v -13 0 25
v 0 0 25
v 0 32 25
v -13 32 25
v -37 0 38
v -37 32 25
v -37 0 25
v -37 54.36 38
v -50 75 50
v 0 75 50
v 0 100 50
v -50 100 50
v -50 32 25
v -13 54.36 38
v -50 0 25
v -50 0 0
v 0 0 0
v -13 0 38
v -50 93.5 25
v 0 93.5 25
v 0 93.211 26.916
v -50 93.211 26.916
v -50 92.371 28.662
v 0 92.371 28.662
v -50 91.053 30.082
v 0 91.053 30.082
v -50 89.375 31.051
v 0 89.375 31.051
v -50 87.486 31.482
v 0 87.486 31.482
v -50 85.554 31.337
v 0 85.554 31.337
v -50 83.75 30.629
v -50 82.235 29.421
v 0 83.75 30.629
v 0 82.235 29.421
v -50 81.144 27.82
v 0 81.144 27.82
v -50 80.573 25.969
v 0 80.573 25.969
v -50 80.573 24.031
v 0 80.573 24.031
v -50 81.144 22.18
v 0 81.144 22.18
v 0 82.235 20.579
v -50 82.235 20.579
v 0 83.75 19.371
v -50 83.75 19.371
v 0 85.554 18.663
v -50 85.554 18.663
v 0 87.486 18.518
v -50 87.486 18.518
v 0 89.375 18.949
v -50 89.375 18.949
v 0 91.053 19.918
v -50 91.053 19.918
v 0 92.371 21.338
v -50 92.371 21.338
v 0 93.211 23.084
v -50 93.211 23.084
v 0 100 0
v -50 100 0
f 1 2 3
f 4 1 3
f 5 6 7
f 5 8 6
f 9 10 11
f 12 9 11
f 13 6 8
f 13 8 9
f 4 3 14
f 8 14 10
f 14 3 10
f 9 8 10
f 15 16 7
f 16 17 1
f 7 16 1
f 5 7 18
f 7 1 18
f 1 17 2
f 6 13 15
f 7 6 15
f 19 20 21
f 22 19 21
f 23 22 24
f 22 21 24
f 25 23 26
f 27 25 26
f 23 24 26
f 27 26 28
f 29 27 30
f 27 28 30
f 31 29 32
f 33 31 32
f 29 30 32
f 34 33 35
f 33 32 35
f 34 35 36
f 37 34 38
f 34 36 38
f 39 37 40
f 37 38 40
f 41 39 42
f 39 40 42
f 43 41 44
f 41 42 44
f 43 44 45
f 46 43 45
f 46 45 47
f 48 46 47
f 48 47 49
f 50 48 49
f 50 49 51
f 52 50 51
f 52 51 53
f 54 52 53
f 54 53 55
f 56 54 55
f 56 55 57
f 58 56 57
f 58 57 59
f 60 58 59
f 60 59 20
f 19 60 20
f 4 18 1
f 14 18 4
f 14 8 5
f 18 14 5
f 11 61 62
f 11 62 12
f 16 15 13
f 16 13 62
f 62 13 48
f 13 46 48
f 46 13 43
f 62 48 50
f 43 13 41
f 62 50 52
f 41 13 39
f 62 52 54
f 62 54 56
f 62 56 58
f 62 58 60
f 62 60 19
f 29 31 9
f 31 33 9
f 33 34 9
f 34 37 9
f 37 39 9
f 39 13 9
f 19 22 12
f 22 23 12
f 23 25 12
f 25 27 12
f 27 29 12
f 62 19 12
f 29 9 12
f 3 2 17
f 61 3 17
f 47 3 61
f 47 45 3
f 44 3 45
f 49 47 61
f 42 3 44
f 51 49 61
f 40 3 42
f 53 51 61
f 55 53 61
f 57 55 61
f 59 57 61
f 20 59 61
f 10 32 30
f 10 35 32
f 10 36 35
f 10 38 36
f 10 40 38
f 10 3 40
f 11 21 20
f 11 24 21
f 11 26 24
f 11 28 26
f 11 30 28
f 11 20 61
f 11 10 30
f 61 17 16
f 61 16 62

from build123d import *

# Parameters (mm, degrees)
F0_W     = 100
F0_H     = 50
F1_DEPTH = 50
F2_R     = 6.5
F3_DEPTH = 50.001
F4_DEPTH = 13
F7_DEPTH = 13
F9_DEPTH = 25


with BuildPart() as f1:
    # F0 (on Right) → F1 (new body)
    with BuildSketch(Plane.YZ):
        with Locations((50, 25)):
            Rectangle(F0_W, F0_H)
    extrude(amount=-F1_DEPTH)

    # F2 (on face) → F3 (cut, through all)
    with BuildSketch(Plane.YZ):
        with Locations((87, 25)):
            Circle(F2_R)
    extrude(amount=-F3_DEPTH, mode=Mode.SUBTRACT)

    # F2 (on face) → F4 (cut)
    with BuildSketch(Plane.YZ):
        Polygon((32, 25), (75, 50), (0, 50), (0, 25), align=None)
    extrude(amount=-F4_DEPTH, mode=Mode.SUBTRACT)

    # F6 (on face) → F7 (cut)
    with BuildSketch(Plane(origin=(-50, 0, 0), x_dir=(0, -1, 0), z_dir=(-1, 0, 0))):
        Polygon((-32, 25), (0, 25), (0, 50), (-75, 50), align=None)
    extrude(amount=-F7_DEPTH, mode=Mode.SUBTRACT)

    # F8 (on face) → F9 (cut)
    with BuildSketch(Plane(origin=(-37, 0, 0), x_dir=(0, -1, 0), z_dir=(-1, 0, 0))):
        Polygon((-54.36, 38), (0, 38), (0, 50), (-75, 50), align=None)
    extrude(amount=-F9_DEPTH, mode=Mode.SUBTRACT)


solid = f1.part
